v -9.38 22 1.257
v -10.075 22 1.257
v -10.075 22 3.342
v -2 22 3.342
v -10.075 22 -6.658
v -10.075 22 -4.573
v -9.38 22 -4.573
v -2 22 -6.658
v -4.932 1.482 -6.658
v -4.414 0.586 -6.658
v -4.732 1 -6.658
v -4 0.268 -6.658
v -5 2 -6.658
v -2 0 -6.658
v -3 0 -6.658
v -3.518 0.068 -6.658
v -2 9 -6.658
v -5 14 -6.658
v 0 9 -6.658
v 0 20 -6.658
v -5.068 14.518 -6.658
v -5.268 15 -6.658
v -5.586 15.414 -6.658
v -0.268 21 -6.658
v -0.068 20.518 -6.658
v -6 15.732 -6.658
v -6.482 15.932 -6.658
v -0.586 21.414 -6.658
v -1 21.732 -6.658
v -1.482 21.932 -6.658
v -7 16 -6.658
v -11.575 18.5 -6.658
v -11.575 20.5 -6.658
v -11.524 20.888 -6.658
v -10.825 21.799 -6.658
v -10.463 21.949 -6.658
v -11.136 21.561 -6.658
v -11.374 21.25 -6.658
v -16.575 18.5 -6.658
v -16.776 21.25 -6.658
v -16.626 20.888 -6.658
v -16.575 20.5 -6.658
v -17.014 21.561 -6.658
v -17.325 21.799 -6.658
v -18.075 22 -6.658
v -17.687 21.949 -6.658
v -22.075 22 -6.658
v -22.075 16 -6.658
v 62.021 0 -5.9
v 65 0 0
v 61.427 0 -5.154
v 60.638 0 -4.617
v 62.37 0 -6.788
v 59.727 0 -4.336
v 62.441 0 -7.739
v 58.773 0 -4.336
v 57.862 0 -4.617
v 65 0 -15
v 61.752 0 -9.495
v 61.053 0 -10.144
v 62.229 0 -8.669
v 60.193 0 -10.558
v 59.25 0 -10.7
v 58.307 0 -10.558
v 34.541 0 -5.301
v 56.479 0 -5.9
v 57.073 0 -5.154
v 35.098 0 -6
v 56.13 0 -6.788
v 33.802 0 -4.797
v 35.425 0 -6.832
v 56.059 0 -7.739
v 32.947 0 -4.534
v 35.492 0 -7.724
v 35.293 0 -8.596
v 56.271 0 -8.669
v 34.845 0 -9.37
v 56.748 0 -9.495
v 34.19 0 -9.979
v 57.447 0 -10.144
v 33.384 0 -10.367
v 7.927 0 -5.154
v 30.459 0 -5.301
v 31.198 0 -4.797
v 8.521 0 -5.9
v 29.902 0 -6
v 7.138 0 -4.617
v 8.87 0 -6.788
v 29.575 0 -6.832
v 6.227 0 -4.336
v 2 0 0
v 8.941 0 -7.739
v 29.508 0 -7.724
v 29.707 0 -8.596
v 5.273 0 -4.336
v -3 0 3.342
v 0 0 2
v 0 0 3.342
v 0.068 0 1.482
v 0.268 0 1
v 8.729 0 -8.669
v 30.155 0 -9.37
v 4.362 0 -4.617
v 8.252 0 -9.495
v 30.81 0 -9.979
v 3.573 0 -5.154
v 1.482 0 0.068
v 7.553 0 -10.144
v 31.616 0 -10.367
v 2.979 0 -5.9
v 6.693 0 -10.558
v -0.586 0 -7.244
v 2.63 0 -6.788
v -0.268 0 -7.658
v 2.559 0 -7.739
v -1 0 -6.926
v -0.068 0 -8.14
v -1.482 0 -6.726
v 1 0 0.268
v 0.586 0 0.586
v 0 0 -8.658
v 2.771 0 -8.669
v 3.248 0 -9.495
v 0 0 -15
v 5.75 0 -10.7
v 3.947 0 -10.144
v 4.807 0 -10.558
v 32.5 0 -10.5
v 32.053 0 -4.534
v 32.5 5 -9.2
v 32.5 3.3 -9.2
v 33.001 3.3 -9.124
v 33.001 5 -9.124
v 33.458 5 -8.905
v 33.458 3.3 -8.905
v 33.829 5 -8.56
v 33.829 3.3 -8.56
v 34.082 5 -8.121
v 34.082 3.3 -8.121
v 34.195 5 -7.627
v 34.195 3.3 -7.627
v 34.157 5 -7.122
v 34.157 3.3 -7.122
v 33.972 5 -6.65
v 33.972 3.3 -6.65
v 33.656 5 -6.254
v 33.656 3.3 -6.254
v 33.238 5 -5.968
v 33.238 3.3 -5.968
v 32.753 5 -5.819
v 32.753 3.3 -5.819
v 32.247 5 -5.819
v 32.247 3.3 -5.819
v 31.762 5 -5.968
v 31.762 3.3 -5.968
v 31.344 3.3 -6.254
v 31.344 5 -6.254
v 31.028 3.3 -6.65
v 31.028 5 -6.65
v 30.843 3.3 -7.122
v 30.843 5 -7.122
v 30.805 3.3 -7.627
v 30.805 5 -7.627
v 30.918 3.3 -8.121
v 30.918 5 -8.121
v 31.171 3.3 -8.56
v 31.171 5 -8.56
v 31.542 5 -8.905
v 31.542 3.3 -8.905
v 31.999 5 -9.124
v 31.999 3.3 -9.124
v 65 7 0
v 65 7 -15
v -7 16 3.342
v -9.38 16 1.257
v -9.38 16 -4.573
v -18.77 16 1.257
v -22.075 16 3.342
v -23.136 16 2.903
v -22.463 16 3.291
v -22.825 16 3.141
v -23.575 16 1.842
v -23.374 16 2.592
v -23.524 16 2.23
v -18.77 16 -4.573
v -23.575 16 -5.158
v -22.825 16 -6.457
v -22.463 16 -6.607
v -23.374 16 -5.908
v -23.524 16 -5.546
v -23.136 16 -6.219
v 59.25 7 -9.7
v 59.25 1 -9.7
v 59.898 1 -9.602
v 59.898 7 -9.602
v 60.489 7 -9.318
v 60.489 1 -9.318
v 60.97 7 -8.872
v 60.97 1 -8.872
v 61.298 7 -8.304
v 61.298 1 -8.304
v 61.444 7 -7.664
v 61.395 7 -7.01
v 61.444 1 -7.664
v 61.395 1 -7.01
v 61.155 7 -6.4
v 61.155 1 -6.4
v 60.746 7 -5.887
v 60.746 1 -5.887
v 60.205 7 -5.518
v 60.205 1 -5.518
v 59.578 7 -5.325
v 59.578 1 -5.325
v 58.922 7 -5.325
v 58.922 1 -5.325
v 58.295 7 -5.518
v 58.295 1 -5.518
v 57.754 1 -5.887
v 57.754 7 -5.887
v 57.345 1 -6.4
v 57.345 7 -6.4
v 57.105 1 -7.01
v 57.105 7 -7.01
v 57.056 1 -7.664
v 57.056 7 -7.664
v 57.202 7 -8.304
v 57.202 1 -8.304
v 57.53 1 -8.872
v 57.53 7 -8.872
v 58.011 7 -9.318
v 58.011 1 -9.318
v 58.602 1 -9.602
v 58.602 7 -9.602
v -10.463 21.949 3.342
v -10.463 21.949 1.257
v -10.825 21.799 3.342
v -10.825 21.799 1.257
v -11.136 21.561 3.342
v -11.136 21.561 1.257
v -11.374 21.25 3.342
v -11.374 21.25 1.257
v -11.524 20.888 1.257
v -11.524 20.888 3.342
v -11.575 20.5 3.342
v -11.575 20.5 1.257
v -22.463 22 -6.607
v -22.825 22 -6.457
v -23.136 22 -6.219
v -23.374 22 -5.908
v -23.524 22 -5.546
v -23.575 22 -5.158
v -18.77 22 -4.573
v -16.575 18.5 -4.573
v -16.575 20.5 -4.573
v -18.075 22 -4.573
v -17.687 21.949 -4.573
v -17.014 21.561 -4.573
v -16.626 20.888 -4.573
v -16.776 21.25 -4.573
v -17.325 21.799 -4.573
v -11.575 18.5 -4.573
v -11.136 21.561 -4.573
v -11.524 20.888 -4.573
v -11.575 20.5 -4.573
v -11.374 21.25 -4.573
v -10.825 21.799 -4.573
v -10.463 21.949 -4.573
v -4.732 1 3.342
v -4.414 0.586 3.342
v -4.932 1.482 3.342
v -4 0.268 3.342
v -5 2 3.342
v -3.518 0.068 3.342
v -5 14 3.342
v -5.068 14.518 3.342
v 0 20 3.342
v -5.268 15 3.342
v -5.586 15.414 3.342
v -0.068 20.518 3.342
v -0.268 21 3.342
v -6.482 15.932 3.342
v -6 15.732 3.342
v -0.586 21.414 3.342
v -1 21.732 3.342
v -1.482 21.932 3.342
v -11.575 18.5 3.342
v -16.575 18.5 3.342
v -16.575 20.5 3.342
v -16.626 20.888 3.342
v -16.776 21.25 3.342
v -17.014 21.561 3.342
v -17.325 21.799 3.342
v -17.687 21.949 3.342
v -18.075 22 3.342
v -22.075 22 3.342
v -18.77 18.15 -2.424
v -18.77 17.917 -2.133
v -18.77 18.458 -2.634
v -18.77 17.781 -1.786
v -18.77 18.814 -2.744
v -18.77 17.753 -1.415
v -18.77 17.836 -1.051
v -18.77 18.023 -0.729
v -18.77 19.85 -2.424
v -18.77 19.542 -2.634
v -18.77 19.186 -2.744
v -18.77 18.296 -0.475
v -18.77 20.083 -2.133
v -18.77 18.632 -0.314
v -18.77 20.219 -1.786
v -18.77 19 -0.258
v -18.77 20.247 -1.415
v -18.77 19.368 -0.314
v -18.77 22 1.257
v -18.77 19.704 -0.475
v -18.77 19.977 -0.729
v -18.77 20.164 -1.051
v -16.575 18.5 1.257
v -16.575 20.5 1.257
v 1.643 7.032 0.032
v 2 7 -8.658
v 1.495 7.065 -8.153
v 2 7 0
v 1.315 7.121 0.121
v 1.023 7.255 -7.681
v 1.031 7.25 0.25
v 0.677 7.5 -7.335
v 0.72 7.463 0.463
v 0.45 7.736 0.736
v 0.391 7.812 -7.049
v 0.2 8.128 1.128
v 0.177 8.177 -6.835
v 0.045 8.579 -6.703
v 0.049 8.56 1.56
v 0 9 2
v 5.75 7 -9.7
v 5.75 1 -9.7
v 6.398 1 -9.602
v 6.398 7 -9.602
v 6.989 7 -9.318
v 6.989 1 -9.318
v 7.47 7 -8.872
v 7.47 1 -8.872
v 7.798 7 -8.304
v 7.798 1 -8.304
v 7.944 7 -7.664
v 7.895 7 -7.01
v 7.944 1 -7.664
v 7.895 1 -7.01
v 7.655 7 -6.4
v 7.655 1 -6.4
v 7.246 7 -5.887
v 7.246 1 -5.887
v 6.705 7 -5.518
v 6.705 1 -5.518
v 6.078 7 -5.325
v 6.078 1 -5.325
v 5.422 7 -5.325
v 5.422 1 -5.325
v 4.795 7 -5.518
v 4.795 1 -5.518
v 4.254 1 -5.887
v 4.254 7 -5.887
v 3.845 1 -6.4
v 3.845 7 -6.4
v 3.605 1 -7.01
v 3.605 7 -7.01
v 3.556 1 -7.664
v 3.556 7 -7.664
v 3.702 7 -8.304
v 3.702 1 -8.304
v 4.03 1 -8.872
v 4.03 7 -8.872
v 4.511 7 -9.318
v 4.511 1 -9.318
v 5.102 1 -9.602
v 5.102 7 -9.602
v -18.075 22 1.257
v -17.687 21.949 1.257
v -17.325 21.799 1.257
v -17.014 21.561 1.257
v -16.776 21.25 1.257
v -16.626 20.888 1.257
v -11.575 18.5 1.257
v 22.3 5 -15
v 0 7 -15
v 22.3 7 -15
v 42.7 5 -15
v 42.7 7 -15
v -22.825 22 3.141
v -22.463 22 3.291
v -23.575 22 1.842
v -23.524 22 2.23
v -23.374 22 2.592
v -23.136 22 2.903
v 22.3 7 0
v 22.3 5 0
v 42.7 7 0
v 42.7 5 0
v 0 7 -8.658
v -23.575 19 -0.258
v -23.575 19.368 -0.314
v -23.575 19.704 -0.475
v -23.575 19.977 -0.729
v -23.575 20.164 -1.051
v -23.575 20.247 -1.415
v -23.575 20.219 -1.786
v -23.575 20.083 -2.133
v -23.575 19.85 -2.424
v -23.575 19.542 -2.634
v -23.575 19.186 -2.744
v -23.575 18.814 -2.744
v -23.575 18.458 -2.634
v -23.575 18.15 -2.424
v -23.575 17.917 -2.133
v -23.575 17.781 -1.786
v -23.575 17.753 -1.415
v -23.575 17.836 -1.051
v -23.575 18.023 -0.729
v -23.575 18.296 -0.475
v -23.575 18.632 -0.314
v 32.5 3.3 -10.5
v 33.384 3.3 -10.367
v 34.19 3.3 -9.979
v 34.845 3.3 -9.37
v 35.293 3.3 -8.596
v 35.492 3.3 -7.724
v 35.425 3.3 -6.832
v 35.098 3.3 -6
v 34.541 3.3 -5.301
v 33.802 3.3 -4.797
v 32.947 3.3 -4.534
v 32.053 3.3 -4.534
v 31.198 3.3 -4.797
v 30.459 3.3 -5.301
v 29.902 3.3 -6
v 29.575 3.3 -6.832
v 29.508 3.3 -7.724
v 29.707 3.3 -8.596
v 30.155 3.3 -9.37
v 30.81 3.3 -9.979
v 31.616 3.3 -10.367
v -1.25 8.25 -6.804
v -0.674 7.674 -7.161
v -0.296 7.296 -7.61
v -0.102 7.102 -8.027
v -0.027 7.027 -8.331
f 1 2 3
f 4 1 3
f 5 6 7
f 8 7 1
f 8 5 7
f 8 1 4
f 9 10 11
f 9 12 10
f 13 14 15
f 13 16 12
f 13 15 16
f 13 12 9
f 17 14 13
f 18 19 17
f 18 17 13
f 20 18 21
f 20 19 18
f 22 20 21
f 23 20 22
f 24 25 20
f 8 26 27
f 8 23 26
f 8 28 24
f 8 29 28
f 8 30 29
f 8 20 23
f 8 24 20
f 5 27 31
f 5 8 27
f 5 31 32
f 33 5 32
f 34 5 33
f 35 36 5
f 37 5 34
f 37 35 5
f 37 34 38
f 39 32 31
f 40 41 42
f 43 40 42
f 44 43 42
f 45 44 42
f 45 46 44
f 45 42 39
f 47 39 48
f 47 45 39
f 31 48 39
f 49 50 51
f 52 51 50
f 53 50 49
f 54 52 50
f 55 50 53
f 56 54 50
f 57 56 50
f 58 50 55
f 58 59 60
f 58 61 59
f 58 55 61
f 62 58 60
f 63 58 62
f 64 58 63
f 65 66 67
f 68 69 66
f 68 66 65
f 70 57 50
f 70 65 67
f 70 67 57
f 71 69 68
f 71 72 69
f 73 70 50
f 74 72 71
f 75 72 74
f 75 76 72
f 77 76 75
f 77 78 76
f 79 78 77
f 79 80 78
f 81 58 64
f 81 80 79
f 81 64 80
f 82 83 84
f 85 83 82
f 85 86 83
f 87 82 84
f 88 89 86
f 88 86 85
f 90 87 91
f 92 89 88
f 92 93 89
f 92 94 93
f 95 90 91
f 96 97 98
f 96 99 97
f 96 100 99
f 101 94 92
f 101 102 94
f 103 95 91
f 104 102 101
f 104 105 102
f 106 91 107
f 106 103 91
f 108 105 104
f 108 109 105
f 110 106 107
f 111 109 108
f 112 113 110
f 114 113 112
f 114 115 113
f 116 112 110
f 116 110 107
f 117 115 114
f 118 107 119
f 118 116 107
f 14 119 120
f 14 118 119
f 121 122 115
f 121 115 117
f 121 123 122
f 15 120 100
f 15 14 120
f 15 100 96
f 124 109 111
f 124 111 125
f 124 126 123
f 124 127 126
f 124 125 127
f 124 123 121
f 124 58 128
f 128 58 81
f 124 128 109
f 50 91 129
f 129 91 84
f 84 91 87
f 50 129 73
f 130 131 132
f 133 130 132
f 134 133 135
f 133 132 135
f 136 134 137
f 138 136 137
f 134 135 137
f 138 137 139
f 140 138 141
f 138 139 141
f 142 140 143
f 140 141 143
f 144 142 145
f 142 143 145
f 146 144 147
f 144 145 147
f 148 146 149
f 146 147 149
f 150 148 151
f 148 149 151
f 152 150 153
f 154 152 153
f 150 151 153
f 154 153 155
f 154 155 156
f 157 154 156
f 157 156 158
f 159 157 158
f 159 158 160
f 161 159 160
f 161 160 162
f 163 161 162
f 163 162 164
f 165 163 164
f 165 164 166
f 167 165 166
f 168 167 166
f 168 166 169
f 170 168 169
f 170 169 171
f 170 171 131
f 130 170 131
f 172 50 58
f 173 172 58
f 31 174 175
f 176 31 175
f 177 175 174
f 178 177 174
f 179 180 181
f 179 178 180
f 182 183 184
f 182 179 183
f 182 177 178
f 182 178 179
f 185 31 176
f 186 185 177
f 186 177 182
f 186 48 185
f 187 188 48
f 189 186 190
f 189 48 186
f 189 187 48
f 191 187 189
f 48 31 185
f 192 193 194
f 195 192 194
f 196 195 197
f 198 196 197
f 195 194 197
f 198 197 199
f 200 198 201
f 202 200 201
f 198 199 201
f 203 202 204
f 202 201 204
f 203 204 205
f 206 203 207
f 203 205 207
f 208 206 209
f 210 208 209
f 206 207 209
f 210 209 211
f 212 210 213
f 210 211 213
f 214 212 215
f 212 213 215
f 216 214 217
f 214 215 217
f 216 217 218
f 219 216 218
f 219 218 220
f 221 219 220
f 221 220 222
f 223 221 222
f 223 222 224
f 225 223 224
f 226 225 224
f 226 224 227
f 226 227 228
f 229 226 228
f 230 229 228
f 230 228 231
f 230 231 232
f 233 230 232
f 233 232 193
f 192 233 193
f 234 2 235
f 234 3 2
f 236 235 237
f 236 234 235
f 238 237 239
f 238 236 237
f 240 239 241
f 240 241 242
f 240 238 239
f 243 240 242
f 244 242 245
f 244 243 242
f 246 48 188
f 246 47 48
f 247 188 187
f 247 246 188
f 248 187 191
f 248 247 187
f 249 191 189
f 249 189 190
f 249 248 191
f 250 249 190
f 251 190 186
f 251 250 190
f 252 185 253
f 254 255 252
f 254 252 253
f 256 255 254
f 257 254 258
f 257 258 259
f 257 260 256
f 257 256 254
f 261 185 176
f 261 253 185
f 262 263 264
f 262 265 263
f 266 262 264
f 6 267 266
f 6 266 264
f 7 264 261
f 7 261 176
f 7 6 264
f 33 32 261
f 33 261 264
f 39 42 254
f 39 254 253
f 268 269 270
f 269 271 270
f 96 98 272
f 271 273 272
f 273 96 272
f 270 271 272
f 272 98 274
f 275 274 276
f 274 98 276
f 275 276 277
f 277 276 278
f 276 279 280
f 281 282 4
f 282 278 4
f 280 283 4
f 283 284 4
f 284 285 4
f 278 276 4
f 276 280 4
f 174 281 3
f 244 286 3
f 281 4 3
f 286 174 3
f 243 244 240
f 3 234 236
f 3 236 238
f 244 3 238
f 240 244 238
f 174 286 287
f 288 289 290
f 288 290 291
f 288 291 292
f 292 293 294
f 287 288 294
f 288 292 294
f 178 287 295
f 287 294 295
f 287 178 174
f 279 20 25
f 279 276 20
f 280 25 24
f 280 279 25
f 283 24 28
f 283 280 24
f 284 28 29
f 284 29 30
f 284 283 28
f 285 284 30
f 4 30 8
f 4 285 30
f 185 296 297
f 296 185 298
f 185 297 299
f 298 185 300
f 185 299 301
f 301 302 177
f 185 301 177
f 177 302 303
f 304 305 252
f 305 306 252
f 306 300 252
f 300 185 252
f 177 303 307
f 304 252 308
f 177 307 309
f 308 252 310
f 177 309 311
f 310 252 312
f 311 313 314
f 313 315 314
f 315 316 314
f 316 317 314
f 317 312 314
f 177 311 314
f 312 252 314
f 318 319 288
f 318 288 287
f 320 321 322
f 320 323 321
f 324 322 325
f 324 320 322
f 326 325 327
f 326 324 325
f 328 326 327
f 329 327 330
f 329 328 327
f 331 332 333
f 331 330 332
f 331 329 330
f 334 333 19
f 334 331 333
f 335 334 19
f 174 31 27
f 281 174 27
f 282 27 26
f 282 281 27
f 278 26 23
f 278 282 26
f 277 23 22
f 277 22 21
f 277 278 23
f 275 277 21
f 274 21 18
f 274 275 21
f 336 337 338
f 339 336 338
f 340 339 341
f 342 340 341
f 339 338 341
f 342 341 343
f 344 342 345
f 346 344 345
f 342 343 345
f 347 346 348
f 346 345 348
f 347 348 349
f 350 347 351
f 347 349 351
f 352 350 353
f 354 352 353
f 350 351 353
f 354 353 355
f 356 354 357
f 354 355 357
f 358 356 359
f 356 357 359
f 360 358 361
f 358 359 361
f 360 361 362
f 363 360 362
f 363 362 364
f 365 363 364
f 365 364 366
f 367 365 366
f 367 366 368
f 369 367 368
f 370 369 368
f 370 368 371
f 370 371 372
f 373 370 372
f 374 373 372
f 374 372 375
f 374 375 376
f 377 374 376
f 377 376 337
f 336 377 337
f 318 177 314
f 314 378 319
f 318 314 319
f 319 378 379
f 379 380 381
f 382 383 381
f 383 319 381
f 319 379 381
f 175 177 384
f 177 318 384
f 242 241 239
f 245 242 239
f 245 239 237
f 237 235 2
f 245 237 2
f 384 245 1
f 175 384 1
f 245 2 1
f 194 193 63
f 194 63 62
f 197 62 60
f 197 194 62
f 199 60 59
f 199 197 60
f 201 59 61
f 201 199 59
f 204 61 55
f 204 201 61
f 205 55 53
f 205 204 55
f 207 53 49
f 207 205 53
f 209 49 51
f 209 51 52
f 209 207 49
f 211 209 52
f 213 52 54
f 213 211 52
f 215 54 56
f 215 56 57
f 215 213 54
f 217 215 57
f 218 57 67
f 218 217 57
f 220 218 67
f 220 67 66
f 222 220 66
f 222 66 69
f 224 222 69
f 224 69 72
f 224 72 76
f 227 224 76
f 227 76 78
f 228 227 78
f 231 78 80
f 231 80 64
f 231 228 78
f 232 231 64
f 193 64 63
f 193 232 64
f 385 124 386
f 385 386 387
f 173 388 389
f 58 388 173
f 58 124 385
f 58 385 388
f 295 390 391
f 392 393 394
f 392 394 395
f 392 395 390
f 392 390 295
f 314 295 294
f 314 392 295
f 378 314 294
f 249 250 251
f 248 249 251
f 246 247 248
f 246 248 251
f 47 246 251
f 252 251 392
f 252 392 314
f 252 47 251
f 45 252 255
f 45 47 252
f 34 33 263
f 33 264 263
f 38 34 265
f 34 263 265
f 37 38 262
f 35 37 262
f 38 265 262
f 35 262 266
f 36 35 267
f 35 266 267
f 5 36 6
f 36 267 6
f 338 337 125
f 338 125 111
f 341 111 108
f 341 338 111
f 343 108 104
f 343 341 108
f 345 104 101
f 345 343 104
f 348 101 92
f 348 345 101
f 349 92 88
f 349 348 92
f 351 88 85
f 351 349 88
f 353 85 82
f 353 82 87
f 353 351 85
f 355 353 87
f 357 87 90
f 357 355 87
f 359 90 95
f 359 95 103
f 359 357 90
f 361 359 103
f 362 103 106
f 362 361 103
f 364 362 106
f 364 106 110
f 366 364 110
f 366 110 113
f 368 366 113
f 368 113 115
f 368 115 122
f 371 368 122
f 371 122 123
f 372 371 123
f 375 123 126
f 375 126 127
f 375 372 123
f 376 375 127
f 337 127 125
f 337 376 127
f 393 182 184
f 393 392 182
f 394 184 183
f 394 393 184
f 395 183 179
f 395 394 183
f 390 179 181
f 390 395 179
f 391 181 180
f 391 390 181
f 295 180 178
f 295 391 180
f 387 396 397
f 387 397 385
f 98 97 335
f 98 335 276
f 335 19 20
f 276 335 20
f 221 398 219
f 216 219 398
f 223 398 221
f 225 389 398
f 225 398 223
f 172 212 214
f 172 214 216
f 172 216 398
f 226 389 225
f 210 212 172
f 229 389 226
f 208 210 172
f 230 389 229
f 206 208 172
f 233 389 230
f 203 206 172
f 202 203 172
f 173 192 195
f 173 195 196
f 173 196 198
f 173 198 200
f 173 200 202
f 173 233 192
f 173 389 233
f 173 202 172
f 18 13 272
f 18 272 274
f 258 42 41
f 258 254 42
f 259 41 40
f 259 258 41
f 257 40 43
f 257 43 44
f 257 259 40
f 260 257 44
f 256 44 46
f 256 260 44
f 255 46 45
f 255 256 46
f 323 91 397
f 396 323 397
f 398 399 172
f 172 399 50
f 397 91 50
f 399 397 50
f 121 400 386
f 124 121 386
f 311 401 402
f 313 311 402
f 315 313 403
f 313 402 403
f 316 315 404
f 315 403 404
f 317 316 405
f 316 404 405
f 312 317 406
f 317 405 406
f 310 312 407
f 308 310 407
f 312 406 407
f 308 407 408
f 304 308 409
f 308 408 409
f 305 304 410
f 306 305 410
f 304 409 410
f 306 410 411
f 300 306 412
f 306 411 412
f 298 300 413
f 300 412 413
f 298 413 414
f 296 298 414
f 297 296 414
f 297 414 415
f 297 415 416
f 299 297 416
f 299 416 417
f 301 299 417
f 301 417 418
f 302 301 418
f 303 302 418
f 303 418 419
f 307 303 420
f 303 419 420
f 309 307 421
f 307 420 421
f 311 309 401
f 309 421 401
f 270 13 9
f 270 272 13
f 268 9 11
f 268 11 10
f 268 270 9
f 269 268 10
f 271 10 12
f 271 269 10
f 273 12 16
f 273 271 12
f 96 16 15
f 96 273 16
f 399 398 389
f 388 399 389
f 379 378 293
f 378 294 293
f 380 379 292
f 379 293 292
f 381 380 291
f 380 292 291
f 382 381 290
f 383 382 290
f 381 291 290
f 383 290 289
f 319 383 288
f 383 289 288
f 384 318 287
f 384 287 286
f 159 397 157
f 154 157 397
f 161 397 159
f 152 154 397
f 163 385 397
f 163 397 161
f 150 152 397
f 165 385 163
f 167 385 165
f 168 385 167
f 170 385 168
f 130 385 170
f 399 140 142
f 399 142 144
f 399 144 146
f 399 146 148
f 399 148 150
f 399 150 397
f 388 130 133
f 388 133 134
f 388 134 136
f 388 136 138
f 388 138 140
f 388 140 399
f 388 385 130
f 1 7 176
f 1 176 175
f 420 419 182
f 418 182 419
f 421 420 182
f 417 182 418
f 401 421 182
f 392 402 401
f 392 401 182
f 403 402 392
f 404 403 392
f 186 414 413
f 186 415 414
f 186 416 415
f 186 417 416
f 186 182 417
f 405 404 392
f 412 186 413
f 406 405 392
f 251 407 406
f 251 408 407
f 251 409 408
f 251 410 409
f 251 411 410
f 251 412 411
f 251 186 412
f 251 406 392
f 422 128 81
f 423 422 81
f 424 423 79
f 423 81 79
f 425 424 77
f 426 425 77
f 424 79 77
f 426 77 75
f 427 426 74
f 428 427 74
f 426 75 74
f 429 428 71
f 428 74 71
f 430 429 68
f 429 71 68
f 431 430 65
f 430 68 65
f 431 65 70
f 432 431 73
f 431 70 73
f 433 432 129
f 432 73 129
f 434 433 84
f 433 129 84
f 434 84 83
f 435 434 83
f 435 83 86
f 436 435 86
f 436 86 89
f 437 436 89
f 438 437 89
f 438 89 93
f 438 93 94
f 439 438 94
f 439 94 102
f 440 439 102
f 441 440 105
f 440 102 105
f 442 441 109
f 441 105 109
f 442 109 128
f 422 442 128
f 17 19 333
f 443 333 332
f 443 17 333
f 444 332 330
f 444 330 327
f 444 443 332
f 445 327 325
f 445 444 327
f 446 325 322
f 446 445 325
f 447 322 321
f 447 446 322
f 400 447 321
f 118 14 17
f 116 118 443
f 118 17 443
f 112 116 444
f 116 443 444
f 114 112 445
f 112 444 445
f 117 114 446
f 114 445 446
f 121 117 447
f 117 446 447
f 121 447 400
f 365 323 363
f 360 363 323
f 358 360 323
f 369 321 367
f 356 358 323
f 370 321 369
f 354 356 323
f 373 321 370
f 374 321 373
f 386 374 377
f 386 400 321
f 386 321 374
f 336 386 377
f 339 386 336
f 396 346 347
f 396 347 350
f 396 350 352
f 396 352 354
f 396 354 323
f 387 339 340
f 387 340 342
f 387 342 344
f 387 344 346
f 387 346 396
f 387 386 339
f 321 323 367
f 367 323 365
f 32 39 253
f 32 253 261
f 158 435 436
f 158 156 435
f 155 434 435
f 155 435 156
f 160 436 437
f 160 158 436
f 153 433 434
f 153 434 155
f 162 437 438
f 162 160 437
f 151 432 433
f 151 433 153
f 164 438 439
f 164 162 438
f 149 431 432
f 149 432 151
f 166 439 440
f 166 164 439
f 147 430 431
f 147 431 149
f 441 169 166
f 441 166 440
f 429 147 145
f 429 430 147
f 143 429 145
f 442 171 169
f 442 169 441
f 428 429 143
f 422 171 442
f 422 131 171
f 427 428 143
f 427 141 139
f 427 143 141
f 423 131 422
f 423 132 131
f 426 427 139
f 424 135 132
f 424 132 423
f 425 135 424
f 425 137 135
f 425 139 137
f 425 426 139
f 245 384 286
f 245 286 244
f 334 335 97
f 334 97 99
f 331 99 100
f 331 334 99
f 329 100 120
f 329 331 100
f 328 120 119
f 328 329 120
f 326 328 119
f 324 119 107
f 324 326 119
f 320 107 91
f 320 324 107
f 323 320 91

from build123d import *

# Parameters (mm, degrees)
SKETCH1_W                = 65
SKETCH1_H                = 15
BOSS_EXTRUDE1_DEPTH      = 7
SKETCH2_W                = 20.4
SKETCH2_H                = 15
CUT_EXTRUDE1_DEPTH       = 2
SKETCH3_R                = 1.7
CUT_EXTRUDE2_DEPTH       = 68.074585351
SKETCH4_R                = 3
CUT_EXTRUDE3_DEPTH       = 3.3
SKETCH5_R                = 2.2
CUT_EXTRUDE4_DEPTH       = 68.074585351
CHAMFER1_SIZE            = 1
BOSS_EXTRUDE2_DEPTH      = 5
BOSS_EXTRUDE2_DEPTH_BACK = 5
CUT_EXTRUDE5_DEPTH       = 69.600291545
CUT_EXTRUDE5_DEPTH_BACK  = 69.600291545
SKETCH7_W                = 9.39
SKETCH7_H                = 5.83
FILLET1_R                = 1.5
FILLET2_R                = 2
FILLET3_R                = 2
FILLET4_R                = 2
SKETCH8_R                = 1.25
CUT_EXTRUDE6_DEPTH       = 4.805
FILLET5_R                = 2


with BuildPart() as part:
    # Sketch1 → Boss-Extrude1 (new body)
    with BuildSketch(Plane(origin=(0, 0, 0), x_dir=(1, 0, 0), z_dir=(0, 1, 0))):
        with Locations((32.5, 7.5)):
            Rectangle(SKETCH1_W, SKETCH1_H)
    extrude(amount=BOSS_EXTRUDE1_DEPTH)

    # Sketch2 → Cut-Extrude1 (cut)
    with BuildSketch(Plane(origin=(0, 7, 0), x_dir=(1, 0, 0), z_dir=(0, 1, 0))):
        with Locations((32.5, 7.5)):
            Rectangle(SKETCH2_W, SKETCH2_H)
    extrude(amount=-CUT_EXTRUDE1_DEPTH, mode=Mode.SUBTRACT)

    # Sketch3 → Cut-Extrude2 (cut, through all)
    with BuildSketch(Plane(origin=(0, 0, 0), x_dir=(-1, 0, 0), z_dir=(0, -1, 0))):
        with Locations(Location((-32.5, 7.5, 0), (0, 0, 90))):
            Circle(SKETCH3_R)
    extrude(amount=-CUT_EXTRUDE2_DEPTH, mode=Mode.SUBTRACT)

    # Sketch4 → Cut-Extrude3 (cut)
    with BuildSketch(Plane(origin=(0, 0, 0), x_dir=(-1, 0, 0), z_dir=(0, -1, 0))):
        with Locations(Location((-32.5, 7.5, 0), (0, 0, 90))):
            Circle(SKETCH4_R)
    extrude(amount=-CUT_EXTRUDE3_DEPTH, mode=Mode.SUBTRACT)

    # Sketch5 → Cut-Extrude4 (cut, through all)
    with BuildSketch(Plane(origin=(0, 0, 0), x_dir=(-1, 0, 0), z_dir=(0, -1, 0))):
        with Locations(Location((-5.75, 7.5, 0), (0, 0, 90))):
            Circle(SKETCH5_R)
        with Locations(Location((-59.25, 7.5, 0), (0, 0, 90))):
            Circle(SKETCH5_R)
    extrude(amount=-CUT_EXTRUDE4_DEPTH, mode=Mode.SUBTRACT)

    # Chamfer1
    chamfer1_edges = [part.edges().sort_by_distance(p)[0] for p in [
        (5.75, 0, -5.3),
        (59.25, 0, -5.3),
    ]]
    chamfer(chamfer1_edges, length=CHAMFER1_SIZE)

    # Sketch6 → Boss-Extrude2 (add, two sides: drawn at the far end of the back side and taken through both)
    with BuildSketch(Plane.XY.offset(-1.658).offset(-BOSS_EXTRUDE2_DEPTH_BACK)):
        Polygon((-16.575, 22), (-16.575, 18.5), (-11.575, 18.5), (-11.575, 22), (0, 22), (0, 7), (0, 0), (-5, 0), (-5, 16), (-23.575, 16), (-23.575, 22), align=None)
    extrude(amount=BOSS_EXTRUDE2_DEPTH + BOSS_EXTRUDE2_DEPTH_BACK)

    # Sketch7 → Cut-Extrude5 (cut, two sides: drawn at the far end of the back side and taken through both)
    with BuildSketch(Plane.XZ.offset(-16).offset(-CUT_EXTRUDE5_DEPTH_BACK)):
        with Locations((-14.075, -1.658)):
            Rectangle(SKETCH7_W, SKETCH7_H)
    extrude(amount=CUT_EXTRUDE5_DEPTH + CUT_EXTRUDE5_DEPTH_BACK, mode=Mode.SUBTRACT)

    # Fillet1
    fillet1_edges = [part.edges().sort_by_distance(p)[0] for p in [
        (-16.575, 22, -5.6155),
        (-11.575, 22, -5.6155),
        (-23.575, 19, -6.658),
        (-23.575, 19, 3.342),
        (-11.575, 22, 2.2995),
        (-16.575, 22, 2.2995),
    ]]
    fillet(fillet1_edges, radius=FILLET1_R)

    # Fillet2
    fillet2_edges = [part.edges().sort_by_distance(p)[0] for p in [
        (-5, 0, -1.658),
        (-5, 16, -1.658),
    ]]
    fillet(fillet2_edges, radius=FILLET2_R)

    # Fillet3
    fillet3_edges = [part.edges().sort_by_distance(p)[0] for p in [
        (0, 22, -1.658),
    ]]
    fillet(fillet3_edges, radius=FILLET3_R)

    # Fillet4
    fillet4_edges = [part.edges().sort_by_distance(p)[0] for p in [
        (0, 3.5, -6.658),
        (0, 3.5, 0),
    ]]
    fillet(fillet4_edges, radius=FILLET4_R)

    # Sketch8 → Cut-Extrude6 (cut)
    with BuildSketch(Plane.ZY.offset(23.575)):
        with Locations((-1.508, 19)):
            Circle(SKETCH8_R)
    extrude(amount=-CUT_EXTRUDE6_DEPTH, mode=Mode.SUBTRACT)

    # Fillet5
    fillet5_edges = [part.edges().sort_by_distance(p)[0] for p in [
        (-1, 7, -6.658),
        (0, 7, -2.329),
    ]]
    fillet(fillet5_edges, radius=FILLET5_R - 0.0001)  # a hair under: the kernel refuses the full size


solid = part.part
